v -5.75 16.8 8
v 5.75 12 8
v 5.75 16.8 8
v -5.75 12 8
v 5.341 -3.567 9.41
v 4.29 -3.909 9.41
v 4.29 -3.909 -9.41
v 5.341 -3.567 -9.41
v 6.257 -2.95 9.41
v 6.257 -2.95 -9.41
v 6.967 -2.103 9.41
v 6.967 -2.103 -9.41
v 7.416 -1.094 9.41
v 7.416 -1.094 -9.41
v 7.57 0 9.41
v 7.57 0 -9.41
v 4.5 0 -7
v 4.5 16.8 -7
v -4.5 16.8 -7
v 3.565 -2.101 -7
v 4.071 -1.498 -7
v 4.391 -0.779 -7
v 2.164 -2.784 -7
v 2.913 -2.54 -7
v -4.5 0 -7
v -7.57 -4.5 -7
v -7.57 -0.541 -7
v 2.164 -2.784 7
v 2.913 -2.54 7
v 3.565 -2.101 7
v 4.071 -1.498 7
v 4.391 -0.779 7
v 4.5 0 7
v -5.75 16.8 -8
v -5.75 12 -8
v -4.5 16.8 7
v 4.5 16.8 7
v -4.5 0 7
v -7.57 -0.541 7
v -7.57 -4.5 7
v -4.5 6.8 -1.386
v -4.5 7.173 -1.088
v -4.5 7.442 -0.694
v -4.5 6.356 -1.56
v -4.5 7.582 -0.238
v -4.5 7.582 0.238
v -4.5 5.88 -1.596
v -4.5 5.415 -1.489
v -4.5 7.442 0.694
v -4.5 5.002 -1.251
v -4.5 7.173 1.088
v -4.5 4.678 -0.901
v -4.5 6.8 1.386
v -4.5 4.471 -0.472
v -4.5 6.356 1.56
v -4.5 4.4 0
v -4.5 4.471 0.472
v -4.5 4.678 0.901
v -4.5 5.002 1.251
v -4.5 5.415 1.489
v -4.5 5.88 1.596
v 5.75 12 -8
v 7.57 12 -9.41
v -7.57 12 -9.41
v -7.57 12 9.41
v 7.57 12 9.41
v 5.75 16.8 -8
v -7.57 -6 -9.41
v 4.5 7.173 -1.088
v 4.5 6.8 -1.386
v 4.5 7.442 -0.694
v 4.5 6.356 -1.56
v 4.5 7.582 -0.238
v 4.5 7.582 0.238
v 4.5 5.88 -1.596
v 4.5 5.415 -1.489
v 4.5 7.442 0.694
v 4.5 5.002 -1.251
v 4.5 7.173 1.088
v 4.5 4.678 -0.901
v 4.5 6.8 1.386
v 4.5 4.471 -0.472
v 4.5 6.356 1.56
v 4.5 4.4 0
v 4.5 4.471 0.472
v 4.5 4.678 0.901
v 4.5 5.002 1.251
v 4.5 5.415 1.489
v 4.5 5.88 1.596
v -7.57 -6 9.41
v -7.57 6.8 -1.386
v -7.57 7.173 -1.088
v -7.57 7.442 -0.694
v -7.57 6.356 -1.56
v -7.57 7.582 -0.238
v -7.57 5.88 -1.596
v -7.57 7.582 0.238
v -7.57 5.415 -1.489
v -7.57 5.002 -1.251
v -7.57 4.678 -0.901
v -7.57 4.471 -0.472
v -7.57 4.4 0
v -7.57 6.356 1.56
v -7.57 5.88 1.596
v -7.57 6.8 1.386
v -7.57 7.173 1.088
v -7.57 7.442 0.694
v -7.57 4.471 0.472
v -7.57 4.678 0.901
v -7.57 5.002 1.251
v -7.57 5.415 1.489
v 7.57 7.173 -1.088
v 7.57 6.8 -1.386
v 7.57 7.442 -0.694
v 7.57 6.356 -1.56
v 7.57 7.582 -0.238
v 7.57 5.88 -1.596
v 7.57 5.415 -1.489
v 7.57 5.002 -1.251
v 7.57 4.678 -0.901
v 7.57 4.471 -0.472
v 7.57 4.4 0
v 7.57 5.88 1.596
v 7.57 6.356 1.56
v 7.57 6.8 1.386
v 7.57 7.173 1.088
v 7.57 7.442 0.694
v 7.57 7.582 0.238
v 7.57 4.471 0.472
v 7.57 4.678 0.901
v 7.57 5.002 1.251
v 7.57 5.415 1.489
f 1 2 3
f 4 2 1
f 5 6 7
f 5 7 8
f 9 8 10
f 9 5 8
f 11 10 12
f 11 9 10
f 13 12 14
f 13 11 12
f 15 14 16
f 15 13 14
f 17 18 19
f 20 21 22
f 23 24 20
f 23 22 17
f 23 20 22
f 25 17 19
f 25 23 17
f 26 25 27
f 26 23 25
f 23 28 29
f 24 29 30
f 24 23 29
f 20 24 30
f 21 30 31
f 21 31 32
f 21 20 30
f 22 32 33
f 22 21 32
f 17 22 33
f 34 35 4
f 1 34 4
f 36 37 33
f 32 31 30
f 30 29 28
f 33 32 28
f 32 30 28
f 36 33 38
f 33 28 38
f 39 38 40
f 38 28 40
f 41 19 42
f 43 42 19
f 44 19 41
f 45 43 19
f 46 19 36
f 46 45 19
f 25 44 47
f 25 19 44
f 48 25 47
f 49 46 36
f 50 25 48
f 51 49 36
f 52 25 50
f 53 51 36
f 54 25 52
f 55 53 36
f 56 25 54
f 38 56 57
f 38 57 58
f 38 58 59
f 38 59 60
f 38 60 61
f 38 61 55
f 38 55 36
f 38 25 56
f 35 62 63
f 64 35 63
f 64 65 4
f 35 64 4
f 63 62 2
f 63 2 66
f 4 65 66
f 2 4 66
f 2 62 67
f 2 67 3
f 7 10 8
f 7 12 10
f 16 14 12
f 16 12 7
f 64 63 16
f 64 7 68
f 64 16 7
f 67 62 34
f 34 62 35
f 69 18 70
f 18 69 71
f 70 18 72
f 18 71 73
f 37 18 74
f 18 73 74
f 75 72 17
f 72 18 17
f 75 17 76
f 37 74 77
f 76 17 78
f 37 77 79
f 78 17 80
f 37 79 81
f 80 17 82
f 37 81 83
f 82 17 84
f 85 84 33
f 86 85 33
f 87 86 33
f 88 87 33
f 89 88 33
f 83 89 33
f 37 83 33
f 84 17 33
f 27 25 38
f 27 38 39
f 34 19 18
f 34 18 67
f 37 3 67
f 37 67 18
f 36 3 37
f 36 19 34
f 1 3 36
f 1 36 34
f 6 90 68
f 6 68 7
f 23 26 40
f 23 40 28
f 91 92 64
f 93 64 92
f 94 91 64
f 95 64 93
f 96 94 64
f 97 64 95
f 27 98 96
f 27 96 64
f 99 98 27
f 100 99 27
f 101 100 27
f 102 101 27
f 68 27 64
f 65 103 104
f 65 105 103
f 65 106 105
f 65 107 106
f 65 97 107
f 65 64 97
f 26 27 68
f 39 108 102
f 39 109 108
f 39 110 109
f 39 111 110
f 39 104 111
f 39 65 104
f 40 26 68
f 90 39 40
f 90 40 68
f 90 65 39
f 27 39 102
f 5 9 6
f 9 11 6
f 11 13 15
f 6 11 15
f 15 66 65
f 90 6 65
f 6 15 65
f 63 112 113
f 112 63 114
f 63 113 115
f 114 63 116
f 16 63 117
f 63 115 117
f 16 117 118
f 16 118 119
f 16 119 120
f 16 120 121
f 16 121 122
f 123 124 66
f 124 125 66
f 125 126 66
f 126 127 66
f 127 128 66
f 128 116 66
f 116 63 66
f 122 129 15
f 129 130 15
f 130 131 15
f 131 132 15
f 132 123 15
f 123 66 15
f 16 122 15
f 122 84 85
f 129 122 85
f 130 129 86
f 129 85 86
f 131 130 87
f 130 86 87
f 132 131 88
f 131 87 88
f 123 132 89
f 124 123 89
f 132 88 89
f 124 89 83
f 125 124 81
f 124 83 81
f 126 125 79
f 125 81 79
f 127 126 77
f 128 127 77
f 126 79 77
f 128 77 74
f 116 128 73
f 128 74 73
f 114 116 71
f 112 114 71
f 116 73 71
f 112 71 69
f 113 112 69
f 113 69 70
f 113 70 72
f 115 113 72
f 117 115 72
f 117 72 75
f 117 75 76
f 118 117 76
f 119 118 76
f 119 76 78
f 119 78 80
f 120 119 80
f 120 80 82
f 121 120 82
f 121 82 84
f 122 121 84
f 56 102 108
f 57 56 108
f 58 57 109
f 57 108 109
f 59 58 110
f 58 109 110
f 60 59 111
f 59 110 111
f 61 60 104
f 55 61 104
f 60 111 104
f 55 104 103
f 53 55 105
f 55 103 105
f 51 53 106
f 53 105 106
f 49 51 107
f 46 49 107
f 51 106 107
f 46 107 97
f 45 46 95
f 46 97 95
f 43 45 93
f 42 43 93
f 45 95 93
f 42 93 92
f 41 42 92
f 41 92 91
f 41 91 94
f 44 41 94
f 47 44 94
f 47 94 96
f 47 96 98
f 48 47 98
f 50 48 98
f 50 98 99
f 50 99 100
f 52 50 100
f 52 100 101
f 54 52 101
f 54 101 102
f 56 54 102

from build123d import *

# Parameters (mm, degrees)
PAD_DEPTH       = 9.41
SKETCH001_W     = 9
SKETCH001_H     = 14
POCKET_DEPTH    = 12
POCKET001_DEPTH = 14
SKETCH003_W     = 11.5
SKETCH003_H     = 16
SKETCH003_W_2   = 9
SKETCH003_H_2   = 14
PAD001_DEPTH    = 4.8
SKETCH004_R     = 1.6
POCKET002_DEPTH = 15.141


with BuildPart() as part:
    # Sketch → Pad (new body, symmetric)
    with BuildSketch(Plane.XY):
        with BuildLine():
            Line((-7.57, 12), (7.57, 12))
            Line((7.57, 12), (7.57, 0))
            ThreePointArc((4.290187, -3.908729), (6.641424, -2.551242), (7.57, 0))
            Line((-7.57, -6), (4.290187, -3.908729))
            Line((-7.57, 0), (-7.57, -6))
            Line((-7.57, 0), (-7.57, 12))
        make_face()
    extrude(amount=PAD_DEPTH, both=True)

    # Sketch001 (on Face1 of Pad) → Pocket (cut)
    with BuildSketch(Plane(origin=(0, 12, 0), x_dir=(-1, 0, 0), z_dir=(0, 1, 0))):
        Rectangle(SKETCH001_W, SKETCH001_H)
    extrude(amount=-POCKET_DEPTH, mode=Mode.SUBTRACT)

    # Sketch002 (on Face7 of Pocket) → Pocket001 (cut)
    with BuildSketch(Plane.XY.offset(-7)):
        with BuildLine():
            Line((-4.5, 0), (-7.57, -0.541324))
            Line((-7.57, -0.541324), (-7.57, -4.5))
            Line((-7.57, -4.5), (2.164299, -2.783581))
            ThreePointArc((2.164299, -2.783581), (3.83872, -1.816853), (4.5, 0))
            Line((-4.5, 0), (4.5, 0))
        make_face()
    extrude(amount=POCKET001_DEPTH, mode=Mode.SUBTRACT)

    # Sketch003 (on Face1 of Pocket001) → Pad001 (join)
    with BuildSketch(Plane(origin=(0, 12, 0), x_dir=(-1, 0, 0), z_dir=(0, 1, 0))):
        Rectangle(SKETCH003_W, SKETCH003_H)
        Rectangle(SKETCH003_W_2, SKETCH003_H_2, mode=Mode.SUBTRACT)
    extrude(amount=PAD001_DEPTH)

    # Sketch004 (on Face2 of Pad001) → Pocket002 (cut, through all)
    with BuildSketch(Plane(origin=(-7.57, 0, 0), x_dir=(0, -1, 0), z_dir=(-1, 0, 0))):
        with Locations((-6, 0)):
            Circle(SKETCH004_R)
    extrude(amount=-POCKET002_DEPTH, mode=Mode.SUBTRACT)


solid = part.part
